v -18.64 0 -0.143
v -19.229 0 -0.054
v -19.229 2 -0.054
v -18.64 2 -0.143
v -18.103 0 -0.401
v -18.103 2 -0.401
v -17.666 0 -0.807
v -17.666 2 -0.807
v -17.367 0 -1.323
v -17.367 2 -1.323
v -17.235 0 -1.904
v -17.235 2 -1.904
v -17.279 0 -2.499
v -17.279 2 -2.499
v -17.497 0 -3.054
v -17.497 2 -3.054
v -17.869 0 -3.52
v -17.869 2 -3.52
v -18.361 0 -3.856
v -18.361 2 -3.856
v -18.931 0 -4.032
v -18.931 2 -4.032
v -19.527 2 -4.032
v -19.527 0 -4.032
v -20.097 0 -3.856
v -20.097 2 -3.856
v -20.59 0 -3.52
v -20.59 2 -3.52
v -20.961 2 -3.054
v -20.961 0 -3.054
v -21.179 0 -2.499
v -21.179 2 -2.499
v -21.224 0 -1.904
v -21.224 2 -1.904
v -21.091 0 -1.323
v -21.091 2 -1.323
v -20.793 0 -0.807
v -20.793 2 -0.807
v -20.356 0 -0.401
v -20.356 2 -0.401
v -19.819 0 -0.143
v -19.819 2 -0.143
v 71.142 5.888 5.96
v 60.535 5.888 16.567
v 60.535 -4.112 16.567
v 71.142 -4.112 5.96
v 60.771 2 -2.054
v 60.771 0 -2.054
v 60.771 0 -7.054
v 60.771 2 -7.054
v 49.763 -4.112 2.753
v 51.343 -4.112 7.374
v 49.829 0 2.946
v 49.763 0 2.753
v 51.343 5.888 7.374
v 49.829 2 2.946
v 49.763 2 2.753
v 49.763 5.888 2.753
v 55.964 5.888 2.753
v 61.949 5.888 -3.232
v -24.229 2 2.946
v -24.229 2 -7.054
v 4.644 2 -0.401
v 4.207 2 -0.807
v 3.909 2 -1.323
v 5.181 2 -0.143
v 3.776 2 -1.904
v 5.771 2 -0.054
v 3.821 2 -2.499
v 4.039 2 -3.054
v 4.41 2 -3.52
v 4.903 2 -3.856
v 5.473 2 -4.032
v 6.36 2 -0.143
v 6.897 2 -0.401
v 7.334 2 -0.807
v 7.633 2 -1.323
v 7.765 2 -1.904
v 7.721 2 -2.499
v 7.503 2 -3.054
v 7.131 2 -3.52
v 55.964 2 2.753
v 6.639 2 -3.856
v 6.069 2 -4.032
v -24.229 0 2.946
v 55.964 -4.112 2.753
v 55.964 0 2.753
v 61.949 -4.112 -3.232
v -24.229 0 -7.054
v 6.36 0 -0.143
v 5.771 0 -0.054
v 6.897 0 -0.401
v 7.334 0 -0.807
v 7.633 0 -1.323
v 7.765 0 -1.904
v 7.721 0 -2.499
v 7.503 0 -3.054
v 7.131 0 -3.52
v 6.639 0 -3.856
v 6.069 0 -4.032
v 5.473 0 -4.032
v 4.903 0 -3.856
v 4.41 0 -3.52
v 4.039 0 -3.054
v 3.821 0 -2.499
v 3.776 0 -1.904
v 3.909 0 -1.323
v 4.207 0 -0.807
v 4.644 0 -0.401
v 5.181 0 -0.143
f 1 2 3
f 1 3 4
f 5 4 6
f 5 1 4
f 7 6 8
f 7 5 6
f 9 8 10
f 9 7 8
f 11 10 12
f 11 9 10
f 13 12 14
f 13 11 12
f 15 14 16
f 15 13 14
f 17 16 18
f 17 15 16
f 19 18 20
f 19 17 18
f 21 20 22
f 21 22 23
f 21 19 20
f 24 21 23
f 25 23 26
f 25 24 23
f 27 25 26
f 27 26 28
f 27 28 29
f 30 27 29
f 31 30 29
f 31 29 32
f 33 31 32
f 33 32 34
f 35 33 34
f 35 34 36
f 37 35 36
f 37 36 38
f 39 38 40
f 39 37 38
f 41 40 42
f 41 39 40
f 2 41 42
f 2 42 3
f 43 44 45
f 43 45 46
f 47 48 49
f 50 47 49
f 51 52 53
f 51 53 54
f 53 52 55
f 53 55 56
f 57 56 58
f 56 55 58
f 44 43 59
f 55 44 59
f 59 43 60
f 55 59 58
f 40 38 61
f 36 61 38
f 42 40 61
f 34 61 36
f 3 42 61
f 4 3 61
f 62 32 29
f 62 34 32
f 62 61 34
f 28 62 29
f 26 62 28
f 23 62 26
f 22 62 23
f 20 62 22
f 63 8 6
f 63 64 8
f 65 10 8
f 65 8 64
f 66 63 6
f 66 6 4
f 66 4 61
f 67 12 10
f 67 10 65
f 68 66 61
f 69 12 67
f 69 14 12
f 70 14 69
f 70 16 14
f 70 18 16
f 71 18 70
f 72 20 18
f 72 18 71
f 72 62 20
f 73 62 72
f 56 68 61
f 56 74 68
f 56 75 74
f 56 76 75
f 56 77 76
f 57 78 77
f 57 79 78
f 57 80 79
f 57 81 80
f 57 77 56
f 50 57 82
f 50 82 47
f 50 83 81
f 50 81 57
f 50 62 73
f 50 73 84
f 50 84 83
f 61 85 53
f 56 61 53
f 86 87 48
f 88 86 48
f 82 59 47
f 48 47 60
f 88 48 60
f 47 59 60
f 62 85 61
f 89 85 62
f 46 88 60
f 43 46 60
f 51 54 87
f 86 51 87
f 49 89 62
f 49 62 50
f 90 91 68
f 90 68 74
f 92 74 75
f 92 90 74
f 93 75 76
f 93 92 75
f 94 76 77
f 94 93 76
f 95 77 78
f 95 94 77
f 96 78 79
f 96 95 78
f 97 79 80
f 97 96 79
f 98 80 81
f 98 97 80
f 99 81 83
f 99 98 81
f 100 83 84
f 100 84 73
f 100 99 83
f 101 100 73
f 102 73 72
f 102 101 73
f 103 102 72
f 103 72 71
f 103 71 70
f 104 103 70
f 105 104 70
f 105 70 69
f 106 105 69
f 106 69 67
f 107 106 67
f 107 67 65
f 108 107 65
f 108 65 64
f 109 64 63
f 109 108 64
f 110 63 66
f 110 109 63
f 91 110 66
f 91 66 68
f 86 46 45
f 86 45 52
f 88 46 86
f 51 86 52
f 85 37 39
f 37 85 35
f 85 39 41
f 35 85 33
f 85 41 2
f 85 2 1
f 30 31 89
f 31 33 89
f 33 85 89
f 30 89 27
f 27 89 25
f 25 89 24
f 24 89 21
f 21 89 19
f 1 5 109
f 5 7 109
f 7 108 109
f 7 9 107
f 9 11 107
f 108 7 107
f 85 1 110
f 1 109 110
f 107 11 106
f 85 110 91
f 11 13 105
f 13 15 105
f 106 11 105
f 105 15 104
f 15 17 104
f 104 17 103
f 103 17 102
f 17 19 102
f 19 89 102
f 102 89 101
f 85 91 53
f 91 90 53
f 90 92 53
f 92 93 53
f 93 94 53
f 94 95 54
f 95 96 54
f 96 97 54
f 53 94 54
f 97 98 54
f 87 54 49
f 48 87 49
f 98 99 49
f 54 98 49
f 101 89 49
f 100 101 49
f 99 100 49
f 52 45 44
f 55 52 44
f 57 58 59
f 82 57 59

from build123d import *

# Parameters (mm, degrees)
SKETCH1_W           = 85
SKETCH1_H           = 10
SKETCH1_R           = 2
BOSS_EXTRUDE1_DEPTH = 2
CUT_EXTRUDE1_DEPTH  = 10
SKETCH3_W           = 15
SKETCH3_H           = 10
BOSS_EXTRUDE2_DEPTH = 13
BOSS_EXTRUDE3_DEPTH = 10


with BuildPart() as part:
    # Sketch1 → Boss-Extrude1 (new body)
    with BuildSketch(Plane(origin=(0, 0, 0), x_dir=(1, 0, 0), z_dir=(0, 1, 0))):
        with Locations((18.270818553, 2.053936679)):
            Rectangle(SKETCH1_W, SKETCH1_H)
        with Locations(Location((-19.229181447, 2.053936679, 0), (0, 0, 270))):
            Circle(SKETCH1_R, mode=Mode.SUBTRACT)
        with Locations(Location((5.770818553, 2.053936679, 0), (0, 0, 270))):
            Circle(SKETCH1_R, mode=Mode.SUBTRACT)
    extrude(amount=BOSS_EXTRUDE1_DEPTH)

    # Sketch2 → Cut-Extrude1 (cut)
    with BuildSketch(Plane(origin=(0, 2, 0), x_dir=(1, 0, 0), z_dir=(0, 1, 0))):
        Polygon((60.770818553, 2.053936679), (55.770818553, -2.946063321), (60.770818553, -2.946063321), align=None)
    extrude(amount=-CUT_EXTRUDE1_DEPTH, mode=Mode.SUBTRACT)

    # Sketch3 → Boss-Extrude2 (add)
    with BuildSketch(Plane(origin=(29.358440937, 0, 29.358440937), x_dir=(0.7071067811865439, 0, -0.7071067811865511), z_dir=(0.7071067811865511, 0, 0.7071067811865439))):
        with Locations((38.590339713, 0.888307249)):
            Rectangle(SKETCH3_W, SKETCH3_H)
    extrude(amount=BOSS_EXTRUDE2_DEPTH)

    # Sketch4 → Boss-Extrude3 (add)
    with BuildSketch(Plane(origin=(0, 5.888307249, 0), x_dir=(1, 0, 0), z_dir=(0, 1, 0))):
        Polygon((51.342630977, -7.374250897), (49.762527896, -2.752596668), (55.964285206, -2.752596668), align=None)
    extrude(amount=-BOSS_EXTRUDE3_DEPTH)


solid = part.part
